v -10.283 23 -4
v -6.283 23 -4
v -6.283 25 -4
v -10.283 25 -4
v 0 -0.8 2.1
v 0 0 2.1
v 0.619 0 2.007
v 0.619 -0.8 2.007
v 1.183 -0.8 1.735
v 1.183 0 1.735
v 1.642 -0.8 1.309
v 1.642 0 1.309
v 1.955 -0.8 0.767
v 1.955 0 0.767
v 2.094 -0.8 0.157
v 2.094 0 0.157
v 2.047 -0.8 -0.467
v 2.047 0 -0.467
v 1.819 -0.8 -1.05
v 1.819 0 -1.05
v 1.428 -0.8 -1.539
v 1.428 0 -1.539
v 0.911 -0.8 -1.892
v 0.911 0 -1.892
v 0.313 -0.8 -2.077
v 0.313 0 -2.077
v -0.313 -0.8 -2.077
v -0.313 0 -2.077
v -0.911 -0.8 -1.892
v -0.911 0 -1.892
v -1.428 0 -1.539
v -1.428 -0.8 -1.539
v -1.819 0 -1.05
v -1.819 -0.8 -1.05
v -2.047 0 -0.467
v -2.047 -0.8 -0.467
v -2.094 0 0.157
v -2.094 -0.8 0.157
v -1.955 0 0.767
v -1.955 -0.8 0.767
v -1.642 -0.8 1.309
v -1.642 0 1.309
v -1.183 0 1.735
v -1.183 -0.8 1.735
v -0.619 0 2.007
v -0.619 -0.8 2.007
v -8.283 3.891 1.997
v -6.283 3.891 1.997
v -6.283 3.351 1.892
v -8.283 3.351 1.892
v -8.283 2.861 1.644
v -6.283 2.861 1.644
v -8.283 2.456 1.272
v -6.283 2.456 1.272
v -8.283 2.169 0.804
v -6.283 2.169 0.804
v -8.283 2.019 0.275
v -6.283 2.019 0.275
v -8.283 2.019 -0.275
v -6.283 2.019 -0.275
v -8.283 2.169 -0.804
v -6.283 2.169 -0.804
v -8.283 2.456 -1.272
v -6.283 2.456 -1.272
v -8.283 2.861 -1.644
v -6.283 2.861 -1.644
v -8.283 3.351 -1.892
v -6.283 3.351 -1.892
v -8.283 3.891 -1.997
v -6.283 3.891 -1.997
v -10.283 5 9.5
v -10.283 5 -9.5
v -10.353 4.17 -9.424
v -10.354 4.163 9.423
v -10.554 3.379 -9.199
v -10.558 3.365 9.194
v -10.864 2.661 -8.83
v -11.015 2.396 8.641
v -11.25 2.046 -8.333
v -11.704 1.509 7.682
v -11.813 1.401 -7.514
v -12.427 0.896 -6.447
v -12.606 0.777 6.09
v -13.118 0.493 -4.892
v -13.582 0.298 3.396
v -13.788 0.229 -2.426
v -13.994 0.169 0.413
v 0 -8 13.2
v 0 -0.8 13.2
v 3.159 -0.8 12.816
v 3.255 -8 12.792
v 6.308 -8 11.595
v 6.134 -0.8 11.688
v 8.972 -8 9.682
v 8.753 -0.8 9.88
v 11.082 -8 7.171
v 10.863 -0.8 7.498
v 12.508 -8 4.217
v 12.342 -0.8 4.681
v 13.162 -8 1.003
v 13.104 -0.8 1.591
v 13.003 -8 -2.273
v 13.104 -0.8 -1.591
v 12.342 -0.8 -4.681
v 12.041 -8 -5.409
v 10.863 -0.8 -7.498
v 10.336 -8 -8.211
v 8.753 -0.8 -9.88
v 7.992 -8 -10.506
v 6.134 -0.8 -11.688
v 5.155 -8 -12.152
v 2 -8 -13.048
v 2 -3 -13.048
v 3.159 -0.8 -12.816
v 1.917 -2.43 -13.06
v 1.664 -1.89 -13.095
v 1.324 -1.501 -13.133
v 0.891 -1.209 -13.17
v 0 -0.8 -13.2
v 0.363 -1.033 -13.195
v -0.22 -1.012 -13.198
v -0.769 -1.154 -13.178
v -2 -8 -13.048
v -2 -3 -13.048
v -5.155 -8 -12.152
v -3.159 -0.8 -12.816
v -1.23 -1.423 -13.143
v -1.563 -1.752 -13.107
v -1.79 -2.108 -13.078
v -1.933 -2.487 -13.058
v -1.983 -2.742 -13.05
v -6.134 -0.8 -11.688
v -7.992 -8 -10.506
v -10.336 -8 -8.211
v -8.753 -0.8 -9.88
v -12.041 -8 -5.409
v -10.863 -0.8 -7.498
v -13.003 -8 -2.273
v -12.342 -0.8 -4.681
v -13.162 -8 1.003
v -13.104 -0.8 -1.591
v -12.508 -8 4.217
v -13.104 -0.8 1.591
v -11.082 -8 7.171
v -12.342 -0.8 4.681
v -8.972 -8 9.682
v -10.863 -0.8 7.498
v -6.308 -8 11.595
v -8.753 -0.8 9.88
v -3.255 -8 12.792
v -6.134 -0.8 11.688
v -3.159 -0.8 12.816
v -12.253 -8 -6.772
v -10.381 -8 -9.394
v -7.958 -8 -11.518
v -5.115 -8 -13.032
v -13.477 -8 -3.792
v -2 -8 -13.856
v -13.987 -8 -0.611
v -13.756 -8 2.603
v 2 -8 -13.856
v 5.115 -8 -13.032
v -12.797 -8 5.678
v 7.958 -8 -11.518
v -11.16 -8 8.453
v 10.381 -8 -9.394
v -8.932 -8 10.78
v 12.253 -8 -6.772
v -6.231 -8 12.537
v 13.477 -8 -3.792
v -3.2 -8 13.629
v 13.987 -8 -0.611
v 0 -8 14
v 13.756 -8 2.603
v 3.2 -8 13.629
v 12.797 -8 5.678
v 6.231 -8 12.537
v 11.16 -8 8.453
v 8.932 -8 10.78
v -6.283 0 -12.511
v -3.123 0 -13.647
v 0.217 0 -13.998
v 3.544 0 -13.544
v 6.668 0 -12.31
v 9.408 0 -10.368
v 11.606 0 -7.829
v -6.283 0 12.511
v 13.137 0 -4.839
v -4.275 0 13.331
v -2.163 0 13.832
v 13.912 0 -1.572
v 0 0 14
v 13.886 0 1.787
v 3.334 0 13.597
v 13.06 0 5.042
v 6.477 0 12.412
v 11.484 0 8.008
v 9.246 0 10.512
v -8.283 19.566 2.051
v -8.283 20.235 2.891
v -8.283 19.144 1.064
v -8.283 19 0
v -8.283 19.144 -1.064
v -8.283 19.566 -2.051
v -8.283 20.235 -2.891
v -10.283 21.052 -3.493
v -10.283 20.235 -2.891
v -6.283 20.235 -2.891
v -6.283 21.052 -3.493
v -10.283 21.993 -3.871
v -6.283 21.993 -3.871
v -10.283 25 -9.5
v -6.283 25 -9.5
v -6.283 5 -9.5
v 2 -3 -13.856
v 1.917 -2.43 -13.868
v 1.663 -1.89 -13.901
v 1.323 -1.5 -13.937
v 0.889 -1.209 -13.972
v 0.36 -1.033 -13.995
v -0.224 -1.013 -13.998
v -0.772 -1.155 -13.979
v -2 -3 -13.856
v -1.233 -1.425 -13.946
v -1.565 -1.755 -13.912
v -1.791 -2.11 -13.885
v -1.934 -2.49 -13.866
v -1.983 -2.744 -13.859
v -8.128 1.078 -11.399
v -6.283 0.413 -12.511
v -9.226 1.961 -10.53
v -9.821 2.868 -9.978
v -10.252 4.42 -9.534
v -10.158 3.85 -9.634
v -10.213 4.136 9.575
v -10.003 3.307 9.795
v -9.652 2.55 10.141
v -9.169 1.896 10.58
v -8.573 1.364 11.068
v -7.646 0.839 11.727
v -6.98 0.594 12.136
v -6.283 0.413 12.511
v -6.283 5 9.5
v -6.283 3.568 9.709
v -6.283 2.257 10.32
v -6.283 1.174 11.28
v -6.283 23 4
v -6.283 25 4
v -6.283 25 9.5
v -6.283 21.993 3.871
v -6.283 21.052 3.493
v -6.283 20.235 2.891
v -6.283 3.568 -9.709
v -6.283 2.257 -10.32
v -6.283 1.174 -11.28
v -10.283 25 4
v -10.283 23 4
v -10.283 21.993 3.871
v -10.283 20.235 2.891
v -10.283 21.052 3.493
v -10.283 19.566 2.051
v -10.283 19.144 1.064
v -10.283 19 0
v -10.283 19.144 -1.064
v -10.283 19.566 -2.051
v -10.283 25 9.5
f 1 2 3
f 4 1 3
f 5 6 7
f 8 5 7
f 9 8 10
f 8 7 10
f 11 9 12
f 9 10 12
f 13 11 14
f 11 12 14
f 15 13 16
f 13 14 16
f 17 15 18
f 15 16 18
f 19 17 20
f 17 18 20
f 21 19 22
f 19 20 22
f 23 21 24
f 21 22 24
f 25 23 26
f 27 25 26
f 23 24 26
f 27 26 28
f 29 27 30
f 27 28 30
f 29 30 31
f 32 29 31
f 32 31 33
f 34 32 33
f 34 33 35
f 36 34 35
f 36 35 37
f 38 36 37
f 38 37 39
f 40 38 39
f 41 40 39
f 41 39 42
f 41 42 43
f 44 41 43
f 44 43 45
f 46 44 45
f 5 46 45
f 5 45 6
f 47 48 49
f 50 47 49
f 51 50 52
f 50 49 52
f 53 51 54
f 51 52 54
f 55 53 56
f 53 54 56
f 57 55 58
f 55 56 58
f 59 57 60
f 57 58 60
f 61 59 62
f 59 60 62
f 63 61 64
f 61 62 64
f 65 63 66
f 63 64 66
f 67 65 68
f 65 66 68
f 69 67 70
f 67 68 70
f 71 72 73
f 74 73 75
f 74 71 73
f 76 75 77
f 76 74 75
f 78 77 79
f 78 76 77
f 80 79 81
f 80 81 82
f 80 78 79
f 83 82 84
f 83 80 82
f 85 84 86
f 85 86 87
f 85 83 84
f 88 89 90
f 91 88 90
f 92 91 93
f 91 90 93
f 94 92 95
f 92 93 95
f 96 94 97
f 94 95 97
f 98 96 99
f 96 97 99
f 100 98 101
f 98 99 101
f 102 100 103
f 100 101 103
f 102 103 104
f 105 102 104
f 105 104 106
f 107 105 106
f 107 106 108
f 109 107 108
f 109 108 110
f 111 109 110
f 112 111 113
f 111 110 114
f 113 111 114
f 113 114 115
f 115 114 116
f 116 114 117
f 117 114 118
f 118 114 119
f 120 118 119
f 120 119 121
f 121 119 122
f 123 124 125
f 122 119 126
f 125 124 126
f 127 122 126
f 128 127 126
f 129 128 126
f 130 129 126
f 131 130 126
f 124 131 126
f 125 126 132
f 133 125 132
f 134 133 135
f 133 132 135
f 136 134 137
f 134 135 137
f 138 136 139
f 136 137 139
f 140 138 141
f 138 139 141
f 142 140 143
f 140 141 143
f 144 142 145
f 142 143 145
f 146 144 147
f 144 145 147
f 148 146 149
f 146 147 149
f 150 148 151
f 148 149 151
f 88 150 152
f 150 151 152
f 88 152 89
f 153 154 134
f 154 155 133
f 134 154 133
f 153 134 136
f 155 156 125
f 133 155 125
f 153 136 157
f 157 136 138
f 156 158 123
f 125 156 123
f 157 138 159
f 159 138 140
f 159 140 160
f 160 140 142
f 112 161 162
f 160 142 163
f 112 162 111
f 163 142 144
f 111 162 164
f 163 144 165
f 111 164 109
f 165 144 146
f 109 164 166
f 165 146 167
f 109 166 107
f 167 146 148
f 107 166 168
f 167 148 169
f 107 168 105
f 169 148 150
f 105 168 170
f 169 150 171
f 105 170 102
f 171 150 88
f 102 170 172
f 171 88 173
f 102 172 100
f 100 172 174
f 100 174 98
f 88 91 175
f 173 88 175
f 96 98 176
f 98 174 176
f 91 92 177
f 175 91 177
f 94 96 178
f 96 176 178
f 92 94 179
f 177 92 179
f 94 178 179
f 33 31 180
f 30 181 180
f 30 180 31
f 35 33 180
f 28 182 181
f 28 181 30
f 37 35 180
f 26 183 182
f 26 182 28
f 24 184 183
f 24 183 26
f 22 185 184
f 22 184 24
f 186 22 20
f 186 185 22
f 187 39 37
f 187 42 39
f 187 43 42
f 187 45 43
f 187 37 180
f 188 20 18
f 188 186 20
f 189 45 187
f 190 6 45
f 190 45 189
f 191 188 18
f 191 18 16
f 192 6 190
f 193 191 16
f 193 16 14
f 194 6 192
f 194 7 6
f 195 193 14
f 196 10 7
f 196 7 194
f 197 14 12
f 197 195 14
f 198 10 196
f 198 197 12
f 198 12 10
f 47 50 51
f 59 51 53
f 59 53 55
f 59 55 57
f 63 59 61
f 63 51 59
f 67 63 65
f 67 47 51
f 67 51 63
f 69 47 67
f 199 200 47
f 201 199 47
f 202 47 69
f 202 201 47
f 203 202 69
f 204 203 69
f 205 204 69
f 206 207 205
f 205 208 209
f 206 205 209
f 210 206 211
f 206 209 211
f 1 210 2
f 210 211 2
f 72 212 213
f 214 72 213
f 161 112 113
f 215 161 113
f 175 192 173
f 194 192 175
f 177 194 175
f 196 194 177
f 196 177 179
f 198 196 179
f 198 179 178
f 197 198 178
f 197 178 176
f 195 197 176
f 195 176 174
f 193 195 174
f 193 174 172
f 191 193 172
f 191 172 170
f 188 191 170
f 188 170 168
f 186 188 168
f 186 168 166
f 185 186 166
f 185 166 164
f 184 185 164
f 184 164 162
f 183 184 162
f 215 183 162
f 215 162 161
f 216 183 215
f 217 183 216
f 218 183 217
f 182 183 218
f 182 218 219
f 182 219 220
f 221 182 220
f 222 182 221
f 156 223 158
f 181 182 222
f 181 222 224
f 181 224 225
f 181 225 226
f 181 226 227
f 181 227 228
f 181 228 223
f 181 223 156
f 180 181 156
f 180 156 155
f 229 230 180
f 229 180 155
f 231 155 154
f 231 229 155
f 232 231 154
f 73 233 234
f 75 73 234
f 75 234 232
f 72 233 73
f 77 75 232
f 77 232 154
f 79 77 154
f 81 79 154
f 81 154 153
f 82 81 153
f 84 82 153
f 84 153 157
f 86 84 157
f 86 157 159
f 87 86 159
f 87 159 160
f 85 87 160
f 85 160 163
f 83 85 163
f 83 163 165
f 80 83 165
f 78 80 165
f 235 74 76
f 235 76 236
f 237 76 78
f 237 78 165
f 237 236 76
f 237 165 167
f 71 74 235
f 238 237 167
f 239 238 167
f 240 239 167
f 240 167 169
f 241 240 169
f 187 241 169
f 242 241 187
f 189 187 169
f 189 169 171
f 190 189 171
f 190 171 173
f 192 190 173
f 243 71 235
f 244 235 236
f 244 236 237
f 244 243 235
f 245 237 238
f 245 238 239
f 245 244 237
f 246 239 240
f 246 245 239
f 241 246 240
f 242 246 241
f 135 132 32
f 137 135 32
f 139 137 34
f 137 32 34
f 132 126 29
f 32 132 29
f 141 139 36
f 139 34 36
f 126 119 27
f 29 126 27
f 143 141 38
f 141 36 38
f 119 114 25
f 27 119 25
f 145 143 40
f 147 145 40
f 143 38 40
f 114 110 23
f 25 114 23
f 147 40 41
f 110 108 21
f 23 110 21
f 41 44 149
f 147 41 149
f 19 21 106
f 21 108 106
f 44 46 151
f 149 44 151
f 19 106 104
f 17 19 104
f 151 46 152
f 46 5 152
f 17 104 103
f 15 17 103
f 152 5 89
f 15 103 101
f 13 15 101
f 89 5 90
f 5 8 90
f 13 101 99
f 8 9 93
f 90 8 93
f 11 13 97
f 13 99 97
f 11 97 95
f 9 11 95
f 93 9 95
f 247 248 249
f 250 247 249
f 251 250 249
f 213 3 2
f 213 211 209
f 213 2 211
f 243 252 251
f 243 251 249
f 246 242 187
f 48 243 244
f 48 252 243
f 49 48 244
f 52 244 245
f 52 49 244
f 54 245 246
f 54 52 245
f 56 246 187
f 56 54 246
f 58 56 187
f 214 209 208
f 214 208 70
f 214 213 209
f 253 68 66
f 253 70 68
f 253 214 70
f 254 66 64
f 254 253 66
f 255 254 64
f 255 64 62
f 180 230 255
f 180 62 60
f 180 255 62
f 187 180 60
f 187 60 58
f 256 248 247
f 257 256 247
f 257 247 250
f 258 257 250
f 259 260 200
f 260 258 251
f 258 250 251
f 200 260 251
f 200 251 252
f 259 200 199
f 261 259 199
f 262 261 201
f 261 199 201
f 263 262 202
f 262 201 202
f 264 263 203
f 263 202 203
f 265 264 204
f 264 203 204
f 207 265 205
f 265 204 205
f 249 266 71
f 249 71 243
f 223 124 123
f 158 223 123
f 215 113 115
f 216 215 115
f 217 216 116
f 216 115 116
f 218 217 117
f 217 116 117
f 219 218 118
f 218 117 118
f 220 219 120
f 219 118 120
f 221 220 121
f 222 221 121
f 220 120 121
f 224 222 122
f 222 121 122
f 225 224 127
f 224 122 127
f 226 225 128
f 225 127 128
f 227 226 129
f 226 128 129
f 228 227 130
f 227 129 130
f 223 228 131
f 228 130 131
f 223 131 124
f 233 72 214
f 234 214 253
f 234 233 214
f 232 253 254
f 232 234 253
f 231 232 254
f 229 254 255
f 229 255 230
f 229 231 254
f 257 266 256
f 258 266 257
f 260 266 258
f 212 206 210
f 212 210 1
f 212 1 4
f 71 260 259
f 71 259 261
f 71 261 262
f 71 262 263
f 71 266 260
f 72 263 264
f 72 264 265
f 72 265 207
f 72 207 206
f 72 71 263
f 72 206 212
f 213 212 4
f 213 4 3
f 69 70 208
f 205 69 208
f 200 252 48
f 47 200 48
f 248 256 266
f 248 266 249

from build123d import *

# Parameters (mm, degrees)
SKETCH1_R           = 14
BOSS_EXTRUDE1_DEPTH = 8
SHELL1_T            = -0.8
SKETCH2_R           = 2.1
CUT_EXTRUDE1_DEPTH  = 2
SKETCH3_W           = 4
SKETCH3_H           = 19
BOSS_EXTRUDE2_DEPTH = 25
CUT_EXTRUDE2_DEPTH  = 19
SKETCH4_3_R         = 2
CUT_EXTRUDE3_DEPTH  = 2
FILLET1_R           = 5
FILLET2_R           = 5
CUT_EXTRUDE4_DEPTH  = 20


with BuildPart() as part:
    # Sketch1 → Boss-Extrude1 (new body)
    with BuildSketch(Plane(origin=(0, 0, 0), x_dir=(1, 0, 0), z_dir=(0, 1, 0))):
        with Locations(Location((0, 0, 0), (0, 0, 270))):
            Circle(SKETCH1_R)
    extrude(amount=-BOSS_EXTRUDE1_DEPTH)

    # Shell1
    shell1_openings = [part.faces().sort_by_distance(p)[0] for p in [
        (0, -8, 0),
    ]]
    offset(amount=SHELL1_T, openings=shell1_openings, kind=Kind.INTERSECTION)

    # Sketch2 → Cut-Extrude1 (cut)
    with BuildSketch(Plane(origin=(0, 0, 0), x_dir=(1, 0, 0), z_dir=(0, 1, 0))):
        with Locations(Location((0, 0, 0), (0, 0, 270))):
            Circle(SKETCH2_R)
    extrude(amount=-CUT_EXTRUDE1_DEPTH, mode=Mode.SUBTRACT)

    # Sketch3 → Boss-Extrude2 (add)
    with BuildSketch(Plane(origin=(0, 0, 0), x_dir=(1, 0, 0), z_dir=(0, 1, 0))):
        with Locations((-8.283481901, 0)):
            Rectangle(SKETCH3_W, SKETCH3_H)
    extrude(amount=BOSS_EXTRUDE2_DEPTH)

    # Sketch4 → Cut-Extrude2 (cut)
    with BuildSketch(Plane(origin=(-6.283481901, 0, 0), x_dir=(0, 0, -1), z_dir=(1, 0, 0))):
        with BuildLine():
            ThreePointArc((-4, 23), (-3.712354677, 21.510562941), (-2.890788624, 20.235340684))
            ThreePointArc((-2.890788624, 20.235340684), (0, 19), (2.890788624, 20.235340684))
            ThreePointArc((2.890788624, 20.235340684), (3.712354677, 21.510562941), (4, 23))
            Line((4, 23), (4, 25))
            Line((4, 25), (-4, 25))
            Line((-4, 25), (-4, 23))
        make_face()
    extrude(amount=-CUT_EXTRUDE2_DEPTH, mode=Mode.SUBTRACT)

    # Sketch4<3> → Cut-Extrude3 (cut)
    with BuildSketch(Plane(origin=(-6.283481901, 0, 0), x_dir=(0, 0, -1), z_dir=(1, 0, 0))):
        with BuildLine():
            ThreePointArc((2.890788624, 20.235340684), (0, 19), (-2.890788624, 20.235340684))
            Line((-2.890788624, 20.235340684), (-1.997016436, 3.890796724))
            ThreePointArc((-1.997016436, 3.890796724), (-0.054622013, 5.99925397), (2, 4))
            ThreePointArc((2, 4), (1.99925397, 3.945377987), (1.997016436, 3.890796724))
            Line((1.997016436, 3.890796724), (2.890788624, 20.235340684))
        make_face()
        with Locations((0, 4)):
            Circle(SKETCH4_3_R)
    extrude(amount=-CUT_EXTRUDE3_DEPTH, mode=Mode.SUBTRACT)

    # Fillet1
    # the kernel refuses this fillet: 5 mm, written as the material it adds along each edge
    with BuildSketch(Plane(origin=(-10.283481901, 0, 9.5), x_dir=(-1, 0, 0), z_dir=(0, 0, -1))) as fillet1_piece_1_section:
        with BuildLine():
            CenterArc((FILLET1_R, FILLET1_R), FILLET1_R, 180, 90)
            Line((0, FILLET1_R), (0, 0))
            Line((0, 0), (FILLET1_R, 0))
        make_face()
    fillet1_piece_1 = extrude(amount=19, mode=Mode.PRIVATE)
    fillet1_piece_1 = fillet1_piece_1 & Plane(origin=(0, 1.284116868, 0), x_dir=(0, 0, 1), z_dir=(0, 1, 0)) * Cylinder(14, 58, mode=Mode.PRIVATE)
    add(fillet1_piece_1)

    # Fillet2
    # the kernel refuses this fillet: 5 mm, written as the material it adds along each edge
    with BuildSketch(Plane(origin=(-22.783481901, 0, -9.5), x_dir=(0, 1, 0), z_dir=(1, 0, 0))) as fillet2_piece_1_section:
        with BuildLine():
            CenterArc((FILLET2_R, -FILLET2_R), FILLET2_R, 90, 90)
            Line((0, -FILLET2_R), (0, 0))
            Line((0, 0), (FILLET2_R, 0))
        make_face()
    fillet2_piece_1 = extrude(amount=16.5, mode=Mode.PRIVATE)
    fillet2_piece_1 = fillet2_piece_1 & Plane(origin=(0, 1.41467333, 0), x_dir=(0, 0, 1), z_dir=(0, 1, 0)) * Cylinder(14, 53, mode=Mode.PRIVATE)
    add(fillet2_piece_1)
    with BuildSketch(Plane(origin=(-6.283481901, 0, 9.5), x_dir=(0, 1, 0), z_dir=(-1, 0, 0))) as fillet2_piece_2_section:
        with BuildLine():
            CenterArc((FILLET2_R, -FILLET2_R), FILLET2_R, 90, 90)
            Line((0, -FILLET2_R), (0, 0))
            Line((0, 0), (FILLET2_R, 0))
        make_face()
    fillet2_piece_2 = extrude(amount=16.5, mode=Mode.PRIVATE)
    fillet2_piece_2 = fillet2_piece_2 & Plane(origin=(0, 1.414673355, 0), x_dir=(0, 0, 1), z_dir=(0, 1, 0)) * Cylinder(14, 53, mode=Mode.PRIVATE)
    add(fillet2_piece_2)

    # Sketch5 → Cut-Extrude4 (cut)
    with BuildSketch(Plane.XY):
        with BuildLine():
            Line((-2, -3), (-2, -8))
            Line((-2, -8), (2, -8))
            Line((2, -8), (2, -3))
            ThreePointArc((2, -3), (0, -1), (-2, -3))
        make_face()
    extrude(amount=-CUT_EXTRUDE4_DEPTH, mode=Mode.SUBTRACT)


solid = part.part
